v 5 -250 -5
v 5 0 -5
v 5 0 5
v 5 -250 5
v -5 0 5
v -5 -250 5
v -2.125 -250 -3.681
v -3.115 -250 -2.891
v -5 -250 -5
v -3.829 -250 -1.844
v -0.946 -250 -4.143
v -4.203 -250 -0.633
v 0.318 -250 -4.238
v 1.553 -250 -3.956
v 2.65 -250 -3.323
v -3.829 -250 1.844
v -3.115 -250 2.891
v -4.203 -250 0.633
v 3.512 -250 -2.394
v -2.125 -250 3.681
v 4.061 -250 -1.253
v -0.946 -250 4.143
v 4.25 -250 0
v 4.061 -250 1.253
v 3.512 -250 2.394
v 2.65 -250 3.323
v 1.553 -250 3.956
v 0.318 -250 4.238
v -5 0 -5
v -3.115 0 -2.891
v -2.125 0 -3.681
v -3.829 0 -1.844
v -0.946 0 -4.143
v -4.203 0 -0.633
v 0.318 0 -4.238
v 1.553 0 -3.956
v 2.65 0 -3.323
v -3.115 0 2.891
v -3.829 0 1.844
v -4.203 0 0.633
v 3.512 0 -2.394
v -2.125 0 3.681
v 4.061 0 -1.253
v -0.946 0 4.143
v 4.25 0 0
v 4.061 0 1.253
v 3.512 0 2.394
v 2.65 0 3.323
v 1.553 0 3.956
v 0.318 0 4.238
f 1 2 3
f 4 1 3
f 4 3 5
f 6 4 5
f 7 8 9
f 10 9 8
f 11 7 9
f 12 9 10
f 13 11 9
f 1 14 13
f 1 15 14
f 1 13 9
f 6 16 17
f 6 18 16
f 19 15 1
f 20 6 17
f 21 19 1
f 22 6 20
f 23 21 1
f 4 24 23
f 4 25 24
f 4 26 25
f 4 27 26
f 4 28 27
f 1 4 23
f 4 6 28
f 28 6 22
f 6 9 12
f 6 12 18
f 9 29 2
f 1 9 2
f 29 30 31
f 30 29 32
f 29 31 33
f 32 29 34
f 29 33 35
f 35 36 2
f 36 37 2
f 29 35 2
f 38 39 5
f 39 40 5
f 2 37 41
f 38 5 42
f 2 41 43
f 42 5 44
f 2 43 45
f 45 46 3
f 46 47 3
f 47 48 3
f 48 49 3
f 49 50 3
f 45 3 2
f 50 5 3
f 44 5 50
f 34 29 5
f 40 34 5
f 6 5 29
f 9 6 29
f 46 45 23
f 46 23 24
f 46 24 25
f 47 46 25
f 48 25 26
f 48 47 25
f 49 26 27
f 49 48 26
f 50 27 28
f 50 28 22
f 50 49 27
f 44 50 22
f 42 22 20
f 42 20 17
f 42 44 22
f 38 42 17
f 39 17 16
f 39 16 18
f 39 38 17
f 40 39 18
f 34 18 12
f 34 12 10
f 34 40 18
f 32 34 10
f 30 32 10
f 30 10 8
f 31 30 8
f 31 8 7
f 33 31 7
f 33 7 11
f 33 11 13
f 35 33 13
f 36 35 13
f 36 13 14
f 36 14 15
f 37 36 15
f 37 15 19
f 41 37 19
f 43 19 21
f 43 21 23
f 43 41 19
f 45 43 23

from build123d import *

# Parameters (mm, degrees)
F0_R     = 4.25
F1_DEPTH = 250


with BuildPart() as f1:
    # F0 (on Front) → F1 (new body)
    with BuildSketch(Plane.XZ):
        Polygon((-4.5, -5), (4.5, -5), (5, -5), (5, -4.5), (5, 4.5), (5, 5), (4.5, 5), (-4.5, 5), (-5, 5), (-5, 4.5), (-5, -4.5), (-5, -5), align=None)
        Circle(F0_R, mode=Mode.SUBTRACT)
    extrude(amount=F1_DEPTH)


solid = f1.part
